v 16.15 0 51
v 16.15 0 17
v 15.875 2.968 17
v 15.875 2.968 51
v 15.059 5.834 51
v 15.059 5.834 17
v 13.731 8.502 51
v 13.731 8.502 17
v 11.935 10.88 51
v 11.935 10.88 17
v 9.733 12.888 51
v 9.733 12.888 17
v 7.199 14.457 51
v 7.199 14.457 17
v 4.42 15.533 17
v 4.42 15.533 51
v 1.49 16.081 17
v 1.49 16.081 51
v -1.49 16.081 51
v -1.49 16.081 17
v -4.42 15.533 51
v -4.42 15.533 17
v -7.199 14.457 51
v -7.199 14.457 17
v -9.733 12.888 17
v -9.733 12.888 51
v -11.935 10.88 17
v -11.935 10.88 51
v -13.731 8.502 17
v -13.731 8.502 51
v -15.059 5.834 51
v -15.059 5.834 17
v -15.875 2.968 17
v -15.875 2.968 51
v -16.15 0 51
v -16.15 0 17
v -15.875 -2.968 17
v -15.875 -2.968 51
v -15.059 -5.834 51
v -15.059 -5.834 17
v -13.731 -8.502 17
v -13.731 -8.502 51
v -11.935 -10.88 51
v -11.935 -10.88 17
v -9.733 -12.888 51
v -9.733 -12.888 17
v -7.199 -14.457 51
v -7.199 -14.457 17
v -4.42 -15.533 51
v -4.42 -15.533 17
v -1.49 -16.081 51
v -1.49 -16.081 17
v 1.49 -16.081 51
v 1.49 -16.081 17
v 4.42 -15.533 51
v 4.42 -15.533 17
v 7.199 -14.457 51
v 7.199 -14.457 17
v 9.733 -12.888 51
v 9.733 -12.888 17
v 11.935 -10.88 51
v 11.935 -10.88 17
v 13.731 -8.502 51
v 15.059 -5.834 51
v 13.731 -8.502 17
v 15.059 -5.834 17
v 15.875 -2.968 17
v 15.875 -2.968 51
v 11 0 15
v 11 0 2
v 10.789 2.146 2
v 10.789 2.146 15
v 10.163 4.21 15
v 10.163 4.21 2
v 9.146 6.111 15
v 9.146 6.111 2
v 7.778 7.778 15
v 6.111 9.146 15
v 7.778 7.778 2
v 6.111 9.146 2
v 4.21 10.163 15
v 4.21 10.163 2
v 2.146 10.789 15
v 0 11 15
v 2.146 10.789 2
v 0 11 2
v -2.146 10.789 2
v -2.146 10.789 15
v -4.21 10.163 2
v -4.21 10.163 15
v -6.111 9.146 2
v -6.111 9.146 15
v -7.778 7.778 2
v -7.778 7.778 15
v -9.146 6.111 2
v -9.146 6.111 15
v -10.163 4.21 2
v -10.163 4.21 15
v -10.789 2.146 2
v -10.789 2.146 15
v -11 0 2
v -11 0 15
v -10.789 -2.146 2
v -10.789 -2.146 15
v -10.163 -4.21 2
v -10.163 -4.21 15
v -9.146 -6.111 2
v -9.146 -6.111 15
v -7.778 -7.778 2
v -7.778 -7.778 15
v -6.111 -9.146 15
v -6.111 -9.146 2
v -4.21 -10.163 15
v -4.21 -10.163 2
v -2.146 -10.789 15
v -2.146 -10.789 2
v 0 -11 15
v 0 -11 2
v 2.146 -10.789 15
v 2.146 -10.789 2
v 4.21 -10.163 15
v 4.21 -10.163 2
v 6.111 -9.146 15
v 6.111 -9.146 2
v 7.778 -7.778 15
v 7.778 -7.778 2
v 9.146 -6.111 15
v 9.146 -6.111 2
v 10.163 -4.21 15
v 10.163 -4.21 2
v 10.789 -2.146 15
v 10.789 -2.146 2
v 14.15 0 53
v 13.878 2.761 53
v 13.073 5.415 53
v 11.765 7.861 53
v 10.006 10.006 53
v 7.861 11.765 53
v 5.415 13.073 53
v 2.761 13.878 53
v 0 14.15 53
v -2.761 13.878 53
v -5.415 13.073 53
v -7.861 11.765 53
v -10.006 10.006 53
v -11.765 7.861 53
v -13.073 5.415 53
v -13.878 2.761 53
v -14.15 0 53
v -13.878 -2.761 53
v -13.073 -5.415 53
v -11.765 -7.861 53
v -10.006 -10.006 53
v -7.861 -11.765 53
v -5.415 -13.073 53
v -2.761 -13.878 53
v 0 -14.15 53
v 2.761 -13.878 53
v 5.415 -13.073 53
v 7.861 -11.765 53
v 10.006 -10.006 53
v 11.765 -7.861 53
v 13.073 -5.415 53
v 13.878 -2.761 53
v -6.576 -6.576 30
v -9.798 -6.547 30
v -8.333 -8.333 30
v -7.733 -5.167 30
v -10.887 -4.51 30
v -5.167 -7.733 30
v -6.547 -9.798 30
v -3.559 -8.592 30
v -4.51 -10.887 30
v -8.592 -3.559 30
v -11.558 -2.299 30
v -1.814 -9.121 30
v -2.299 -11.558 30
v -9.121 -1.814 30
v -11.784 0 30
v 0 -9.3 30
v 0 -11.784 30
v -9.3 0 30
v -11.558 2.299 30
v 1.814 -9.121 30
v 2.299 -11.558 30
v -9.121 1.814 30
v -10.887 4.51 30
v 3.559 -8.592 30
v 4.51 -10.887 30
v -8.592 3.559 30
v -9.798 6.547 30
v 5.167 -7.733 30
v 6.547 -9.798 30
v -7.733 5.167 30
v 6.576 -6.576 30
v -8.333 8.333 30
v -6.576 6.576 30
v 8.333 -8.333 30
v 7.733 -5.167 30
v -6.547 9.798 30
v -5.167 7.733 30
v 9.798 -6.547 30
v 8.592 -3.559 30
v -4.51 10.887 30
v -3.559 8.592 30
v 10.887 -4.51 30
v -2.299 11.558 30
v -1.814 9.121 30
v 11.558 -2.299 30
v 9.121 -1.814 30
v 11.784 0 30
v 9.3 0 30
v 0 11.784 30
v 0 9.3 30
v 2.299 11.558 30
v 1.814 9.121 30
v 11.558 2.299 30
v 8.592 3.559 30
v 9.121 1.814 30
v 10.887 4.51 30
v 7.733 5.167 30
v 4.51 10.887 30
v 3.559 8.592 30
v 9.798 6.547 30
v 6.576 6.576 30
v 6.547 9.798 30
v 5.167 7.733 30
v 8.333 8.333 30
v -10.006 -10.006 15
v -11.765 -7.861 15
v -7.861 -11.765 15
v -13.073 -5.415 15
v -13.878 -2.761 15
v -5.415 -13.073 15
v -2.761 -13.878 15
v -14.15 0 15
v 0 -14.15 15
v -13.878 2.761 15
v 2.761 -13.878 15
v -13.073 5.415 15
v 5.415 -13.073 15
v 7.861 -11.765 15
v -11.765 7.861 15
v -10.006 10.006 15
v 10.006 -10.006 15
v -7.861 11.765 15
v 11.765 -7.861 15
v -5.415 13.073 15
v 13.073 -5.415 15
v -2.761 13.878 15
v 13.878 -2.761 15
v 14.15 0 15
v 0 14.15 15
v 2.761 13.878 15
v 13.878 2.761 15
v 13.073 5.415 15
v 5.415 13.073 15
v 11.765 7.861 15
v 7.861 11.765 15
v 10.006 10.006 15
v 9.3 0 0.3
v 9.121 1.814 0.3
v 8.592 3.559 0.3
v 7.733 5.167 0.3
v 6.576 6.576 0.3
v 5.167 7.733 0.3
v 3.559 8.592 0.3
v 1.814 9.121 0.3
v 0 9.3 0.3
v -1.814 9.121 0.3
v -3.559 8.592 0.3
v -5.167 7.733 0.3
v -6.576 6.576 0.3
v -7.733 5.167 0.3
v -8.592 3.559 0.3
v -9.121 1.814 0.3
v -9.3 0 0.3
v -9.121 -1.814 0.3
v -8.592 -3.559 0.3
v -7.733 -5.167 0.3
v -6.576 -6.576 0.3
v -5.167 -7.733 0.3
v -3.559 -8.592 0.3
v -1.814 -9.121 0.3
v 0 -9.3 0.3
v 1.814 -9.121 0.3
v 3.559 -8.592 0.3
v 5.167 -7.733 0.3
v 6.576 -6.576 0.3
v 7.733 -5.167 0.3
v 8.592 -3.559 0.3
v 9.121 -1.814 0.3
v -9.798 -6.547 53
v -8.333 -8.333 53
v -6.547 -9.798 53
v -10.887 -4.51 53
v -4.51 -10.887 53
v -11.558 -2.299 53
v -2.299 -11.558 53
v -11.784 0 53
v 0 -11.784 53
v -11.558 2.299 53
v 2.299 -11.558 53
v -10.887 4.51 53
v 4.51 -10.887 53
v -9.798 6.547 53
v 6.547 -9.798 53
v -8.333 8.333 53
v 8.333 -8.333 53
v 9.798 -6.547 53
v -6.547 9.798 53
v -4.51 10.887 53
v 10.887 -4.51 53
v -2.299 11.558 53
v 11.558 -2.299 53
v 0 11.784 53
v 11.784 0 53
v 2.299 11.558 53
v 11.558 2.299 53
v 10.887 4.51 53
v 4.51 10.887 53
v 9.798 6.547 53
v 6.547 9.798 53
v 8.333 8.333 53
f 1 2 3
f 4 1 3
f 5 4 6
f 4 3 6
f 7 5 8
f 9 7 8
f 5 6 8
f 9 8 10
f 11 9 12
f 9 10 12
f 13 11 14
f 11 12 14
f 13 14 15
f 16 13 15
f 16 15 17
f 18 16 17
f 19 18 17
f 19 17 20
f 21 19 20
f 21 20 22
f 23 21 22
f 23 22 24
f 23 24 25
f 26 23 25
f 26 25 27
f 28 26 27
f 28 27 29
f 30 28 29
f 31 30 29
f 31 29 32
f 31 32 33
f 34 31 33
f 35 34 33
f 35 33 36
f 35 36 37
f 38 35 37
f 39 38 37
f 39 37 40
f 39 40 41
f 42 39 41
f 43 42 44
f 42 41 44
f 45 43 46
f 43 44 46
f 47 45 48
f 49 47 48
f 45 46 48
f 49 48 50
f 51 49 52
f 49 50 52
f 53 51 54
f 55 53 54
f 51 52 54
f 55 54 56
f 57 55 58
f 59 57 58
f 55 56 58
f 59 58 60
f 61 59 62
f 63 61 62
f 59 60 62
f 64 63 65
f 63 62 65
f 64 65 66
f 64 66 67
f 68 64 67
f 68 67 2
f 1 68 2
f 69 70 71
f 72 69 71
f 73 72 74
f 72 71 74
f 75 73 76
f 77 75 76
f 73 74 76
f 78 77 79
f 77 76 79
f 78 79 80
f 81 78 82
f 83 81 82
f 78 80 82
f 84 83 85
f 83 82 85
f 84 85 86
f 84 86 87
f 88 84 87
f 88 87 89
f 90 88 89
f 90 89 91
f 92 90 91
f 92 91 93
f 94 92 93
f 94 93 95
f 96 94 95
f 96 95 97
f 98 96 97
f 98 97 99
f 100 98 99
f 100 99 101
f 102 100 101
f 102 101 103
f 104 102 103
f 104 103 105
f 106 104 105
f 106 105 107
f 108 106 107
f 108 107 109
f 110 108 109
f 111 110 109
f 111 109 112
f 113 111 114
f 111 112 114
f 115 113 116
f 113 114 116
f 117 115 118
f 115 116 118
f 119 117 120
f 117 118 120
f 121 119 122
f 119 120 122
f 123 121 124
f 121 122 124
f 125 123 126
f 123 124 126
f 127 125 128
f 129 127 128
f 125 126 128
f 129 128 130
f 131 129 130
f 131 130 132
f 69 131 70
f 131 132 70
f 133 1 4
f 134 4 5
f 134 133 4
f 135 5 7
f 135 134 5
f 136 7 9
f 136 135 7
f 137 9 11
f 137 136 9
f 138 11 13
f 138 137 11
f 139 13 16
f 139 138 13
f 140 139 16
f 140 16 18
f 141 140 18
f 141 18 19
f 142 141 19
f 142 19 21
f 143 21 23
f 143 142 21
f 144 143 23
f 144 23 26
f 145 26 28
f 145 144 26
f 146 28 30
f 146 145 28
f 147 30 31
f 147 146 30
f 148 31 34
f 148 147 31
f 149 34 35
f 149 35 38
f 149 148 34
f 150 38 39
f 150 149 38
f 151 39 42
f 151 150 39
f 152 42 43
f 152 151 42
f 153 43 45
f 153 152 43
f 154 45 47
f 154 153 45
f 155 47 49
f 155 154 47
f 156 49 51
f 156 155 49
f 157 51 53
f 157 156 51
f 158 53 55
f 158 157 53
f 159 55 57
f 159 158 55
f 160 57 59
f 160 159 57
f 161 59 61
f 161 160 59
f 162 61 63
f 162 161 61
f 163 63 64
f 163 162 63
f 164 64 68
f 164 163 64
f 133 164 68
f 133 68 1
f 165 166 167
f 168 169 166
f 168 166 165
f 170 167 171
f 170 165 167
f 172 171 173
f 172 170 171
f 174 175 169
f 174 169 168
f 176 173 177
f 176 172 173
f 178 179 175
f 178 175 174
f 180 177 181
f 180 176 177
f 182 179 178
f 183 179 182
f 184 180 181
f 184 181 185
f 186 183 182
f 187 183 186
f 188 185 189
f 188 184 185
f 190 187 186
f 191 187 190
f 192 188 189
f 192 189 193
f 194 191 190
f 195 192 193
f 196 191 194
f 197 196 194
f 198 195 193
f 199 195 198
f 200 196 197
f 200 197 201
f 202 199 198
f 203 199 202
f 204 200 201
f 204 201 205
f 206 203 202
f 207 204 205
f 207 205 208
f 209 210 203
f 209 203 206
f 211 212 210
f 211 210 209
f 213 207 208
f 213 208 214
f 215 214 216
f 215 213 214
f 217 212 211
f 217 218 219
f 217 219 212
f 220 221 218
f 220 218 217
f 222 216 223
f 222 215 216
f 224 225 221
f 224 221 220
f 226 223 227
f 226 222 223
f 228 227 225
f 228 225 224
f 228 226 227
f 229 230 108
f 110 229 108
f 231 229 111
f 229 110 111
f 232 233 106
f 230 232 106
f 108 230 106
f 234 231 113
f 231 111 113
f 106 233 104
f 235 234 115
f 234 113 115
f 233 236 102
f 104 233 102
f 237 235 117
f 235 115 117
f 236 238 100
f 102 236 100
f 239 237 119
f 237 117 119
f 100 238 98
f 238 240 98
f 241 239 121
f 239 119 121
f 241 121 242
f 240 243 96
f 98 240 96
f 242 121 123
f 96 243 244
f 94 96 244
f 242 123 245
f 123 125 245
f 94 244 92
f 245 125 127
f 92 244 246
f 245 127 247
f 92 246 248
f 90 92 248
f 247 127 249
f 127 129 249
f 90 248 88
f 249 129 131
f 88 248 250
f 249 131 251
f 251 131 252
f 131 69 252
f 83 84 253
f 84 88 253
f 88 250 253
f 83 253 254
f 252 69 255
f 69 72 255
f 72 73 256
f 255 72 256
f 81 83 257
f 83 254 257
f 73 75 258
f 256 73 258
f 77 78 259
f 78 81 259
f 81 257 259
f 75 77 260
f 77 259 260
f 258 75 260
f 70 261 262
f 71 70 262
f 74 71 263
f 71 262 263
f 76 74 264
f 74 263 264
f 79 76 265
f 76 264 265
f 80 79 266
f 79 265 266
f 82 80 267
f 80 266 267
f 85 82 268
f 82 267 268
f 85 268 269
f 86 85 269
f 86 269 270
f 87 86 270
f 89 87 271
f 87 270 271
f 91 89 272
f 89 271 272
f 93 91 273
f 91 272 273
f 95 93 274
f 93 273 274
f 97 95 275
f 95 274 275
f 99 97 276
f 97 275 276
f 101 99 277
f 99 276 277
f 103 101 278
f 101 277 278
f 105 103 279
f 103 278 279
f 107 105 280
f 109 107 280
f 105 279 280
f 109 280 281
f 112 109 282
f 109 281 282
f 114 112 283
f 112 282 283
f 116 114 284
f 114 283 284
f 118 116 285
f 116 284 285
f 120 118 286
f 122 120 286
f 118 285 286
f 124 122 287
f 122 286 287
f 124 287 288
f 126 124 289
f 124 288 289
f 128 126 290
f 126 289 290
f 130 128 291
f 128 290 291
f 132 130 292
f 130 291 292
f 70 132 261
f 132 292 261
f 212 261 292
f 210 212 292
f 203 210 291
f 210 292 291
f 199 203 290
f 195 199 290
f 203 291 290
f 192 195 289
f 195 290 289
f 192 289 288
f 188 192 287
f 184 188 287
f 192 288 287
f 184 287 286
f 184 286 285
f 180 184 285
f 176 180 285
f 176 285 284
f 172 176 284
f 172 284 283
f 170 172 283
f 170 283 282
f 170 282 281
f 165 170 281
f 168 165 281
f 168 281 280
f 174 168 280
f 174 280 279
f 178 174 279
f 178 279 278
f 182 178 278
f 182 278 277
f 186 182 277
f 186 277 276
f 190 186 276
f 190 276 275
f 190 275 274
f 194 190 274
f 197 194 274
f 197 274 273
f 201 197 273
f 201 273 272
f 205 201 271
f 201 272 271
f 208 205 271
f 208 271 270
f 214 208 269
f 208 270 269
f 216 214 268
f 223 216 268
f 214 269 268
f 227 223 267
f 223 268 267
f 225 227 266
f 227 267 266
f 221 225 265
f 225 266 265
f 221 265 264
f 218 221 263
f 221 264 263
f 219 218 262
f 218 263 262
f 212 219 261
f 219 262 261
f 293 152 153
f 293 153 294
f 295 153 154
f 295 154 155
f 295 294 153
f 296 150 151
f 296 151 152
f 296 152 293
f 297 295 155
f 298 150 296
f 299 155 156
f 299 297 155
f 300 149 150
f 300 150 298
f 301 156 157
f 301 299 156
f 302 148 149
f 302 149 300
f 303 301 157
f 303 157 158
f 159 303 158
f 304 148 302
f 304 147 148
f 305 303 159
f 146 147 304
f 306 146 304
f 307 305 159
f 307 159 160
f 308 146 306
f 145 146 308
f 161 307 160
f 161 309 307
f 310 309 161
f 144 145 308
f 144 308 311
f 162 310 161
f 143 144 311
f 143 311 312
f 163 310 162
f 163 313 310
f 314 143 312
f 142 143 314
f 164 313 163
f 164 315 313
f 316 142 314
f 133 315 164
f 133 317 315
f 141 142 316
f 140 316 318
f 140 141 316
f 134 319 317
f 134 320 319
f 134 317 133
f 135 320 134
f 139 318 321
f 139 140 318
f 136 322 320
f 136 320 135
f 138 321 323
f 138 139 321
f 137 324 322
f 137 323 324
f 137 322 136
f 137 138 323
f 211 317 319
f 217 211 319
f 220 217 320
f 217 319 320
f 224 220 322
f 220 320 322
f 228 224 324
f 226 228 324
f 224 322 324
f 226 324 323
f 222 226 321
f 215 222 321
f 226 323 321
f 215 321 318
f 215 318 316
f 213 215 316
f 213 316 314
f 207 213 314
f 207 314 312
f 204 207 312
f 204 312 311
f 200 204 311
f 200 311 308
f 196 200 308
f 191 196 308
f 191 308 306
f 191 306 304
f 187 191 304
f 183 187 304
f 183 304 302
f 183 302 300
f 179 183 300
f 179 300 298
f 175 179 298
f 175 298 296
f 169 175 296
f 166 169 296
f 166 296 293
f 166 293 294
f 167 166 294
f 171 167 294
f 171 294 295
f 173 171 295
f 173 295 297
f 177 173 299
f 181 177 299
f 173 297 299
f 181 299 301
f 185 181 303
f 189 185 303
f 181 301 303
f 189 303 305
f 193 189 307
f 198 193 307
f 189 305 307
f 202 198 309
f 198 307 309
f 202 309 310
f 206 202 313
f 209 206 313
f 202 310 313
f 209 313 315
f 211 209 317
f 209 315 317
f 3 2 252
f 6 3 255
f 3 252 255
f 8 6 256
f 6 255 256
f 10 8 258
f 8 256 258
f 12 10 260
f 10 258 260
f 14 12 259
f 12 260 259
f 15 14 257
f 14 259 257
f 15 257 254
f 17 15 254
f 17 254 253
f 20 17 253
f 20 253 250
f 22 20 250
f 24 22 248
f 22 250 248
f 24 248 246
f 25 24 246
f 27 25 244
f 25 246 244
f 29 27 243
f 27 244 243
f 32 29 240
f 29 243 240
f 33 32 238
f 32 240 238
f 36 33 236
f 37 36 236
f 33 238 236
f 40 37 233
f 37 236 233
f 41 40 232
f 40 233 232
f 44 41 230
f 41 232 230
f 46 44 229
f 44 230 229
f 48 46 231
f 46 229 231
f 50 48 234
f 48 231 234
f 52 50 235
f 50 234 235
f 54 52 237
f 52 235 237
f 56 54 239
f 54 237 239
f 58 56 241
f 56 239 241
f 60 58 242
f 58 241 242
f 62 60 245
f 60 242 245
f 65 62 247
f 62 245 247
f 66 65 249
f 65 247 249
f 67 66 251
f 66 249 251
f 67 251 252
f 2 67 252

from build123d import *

# Parameters (mm, degrees)
F0_R     = 11
F1_DEPTH = 15
F2_R     = 16.15
F3_DEPTH = 38
F4_R     = 9.3
F5_DEPTH = 53.001
F7_R     = 11.7844294456
F8_DEPTH = 25


# Not quite as in the source:
# - a fillet or chamfer that OpenCascade refuses, or shapes differently, is made with other operations: its cross-section is extruded or revolved along the edge and cut away or added


with BuildPart() as f1:
    # F0 (on Top) → F1 (new body)
    with BuildSketch(Plane.XY):
        Circle(F0_R)
    extrude(amount=F1_DEPTH)

    # F2 (on face) → F3 (join)
    with BuildSketch(Plane.XY.offset(15)):
        Circle(F2_R)
    extrude(amount=F3_DEPTH)

    # F4 (on face) → F5 (cut, through all)
    with BuildSketch(Plane(origin=(0, 0, 0), x_dir=(1, 0, 0), z_dir=(0, 0, -1))):
        Circle(F4_R)
    extrude(amount=-F5_DEPTH, mode=Mode.SUBTRACT)

    # F7 (on offset) → F8 (cut)
    with BuildSketch(Plane.XY.offset(55)):
        Circle(F7_R)
    extrude(amount=-F8_DEPTH, mode=Mode.SUBTRACT)

    # F9: chamfer of 2 on 3 edges, made by hand

    # F9_s1 → F9_t2 (revolve, cut)
    with BuildSketch(Plane.XZ):
        Polygon((16.15, 51), (14.15, 53), (16.15, 53), align=None)
    revolve(axis=Axis((0, 0, 53), (0, 0, 1)), mode=Mode.SUBTRACT)

    # F9_s3 → F9_t4 (revolve, cut)
    with BuildSketch(Plane.XZ):
        Polygon((11, 2), (9, 0), (11, 0), align=None)
    revolve(axis=Axis((0, 0, 0), (0, 0, 1)), mode=Mode.SUBTRACT)

    # F9_s5 → F9_t6 (revolve, cut)
    with BuildSketch(Plane.XZ):
        Polygon((16.15, 17), (14.15, 15), (16.15, 15), align=None)
    revolve(axis=Axis((0, 0, 15), (0, 0, 1)), mode=Mode.SUBTRACT)


solid = f1.part
